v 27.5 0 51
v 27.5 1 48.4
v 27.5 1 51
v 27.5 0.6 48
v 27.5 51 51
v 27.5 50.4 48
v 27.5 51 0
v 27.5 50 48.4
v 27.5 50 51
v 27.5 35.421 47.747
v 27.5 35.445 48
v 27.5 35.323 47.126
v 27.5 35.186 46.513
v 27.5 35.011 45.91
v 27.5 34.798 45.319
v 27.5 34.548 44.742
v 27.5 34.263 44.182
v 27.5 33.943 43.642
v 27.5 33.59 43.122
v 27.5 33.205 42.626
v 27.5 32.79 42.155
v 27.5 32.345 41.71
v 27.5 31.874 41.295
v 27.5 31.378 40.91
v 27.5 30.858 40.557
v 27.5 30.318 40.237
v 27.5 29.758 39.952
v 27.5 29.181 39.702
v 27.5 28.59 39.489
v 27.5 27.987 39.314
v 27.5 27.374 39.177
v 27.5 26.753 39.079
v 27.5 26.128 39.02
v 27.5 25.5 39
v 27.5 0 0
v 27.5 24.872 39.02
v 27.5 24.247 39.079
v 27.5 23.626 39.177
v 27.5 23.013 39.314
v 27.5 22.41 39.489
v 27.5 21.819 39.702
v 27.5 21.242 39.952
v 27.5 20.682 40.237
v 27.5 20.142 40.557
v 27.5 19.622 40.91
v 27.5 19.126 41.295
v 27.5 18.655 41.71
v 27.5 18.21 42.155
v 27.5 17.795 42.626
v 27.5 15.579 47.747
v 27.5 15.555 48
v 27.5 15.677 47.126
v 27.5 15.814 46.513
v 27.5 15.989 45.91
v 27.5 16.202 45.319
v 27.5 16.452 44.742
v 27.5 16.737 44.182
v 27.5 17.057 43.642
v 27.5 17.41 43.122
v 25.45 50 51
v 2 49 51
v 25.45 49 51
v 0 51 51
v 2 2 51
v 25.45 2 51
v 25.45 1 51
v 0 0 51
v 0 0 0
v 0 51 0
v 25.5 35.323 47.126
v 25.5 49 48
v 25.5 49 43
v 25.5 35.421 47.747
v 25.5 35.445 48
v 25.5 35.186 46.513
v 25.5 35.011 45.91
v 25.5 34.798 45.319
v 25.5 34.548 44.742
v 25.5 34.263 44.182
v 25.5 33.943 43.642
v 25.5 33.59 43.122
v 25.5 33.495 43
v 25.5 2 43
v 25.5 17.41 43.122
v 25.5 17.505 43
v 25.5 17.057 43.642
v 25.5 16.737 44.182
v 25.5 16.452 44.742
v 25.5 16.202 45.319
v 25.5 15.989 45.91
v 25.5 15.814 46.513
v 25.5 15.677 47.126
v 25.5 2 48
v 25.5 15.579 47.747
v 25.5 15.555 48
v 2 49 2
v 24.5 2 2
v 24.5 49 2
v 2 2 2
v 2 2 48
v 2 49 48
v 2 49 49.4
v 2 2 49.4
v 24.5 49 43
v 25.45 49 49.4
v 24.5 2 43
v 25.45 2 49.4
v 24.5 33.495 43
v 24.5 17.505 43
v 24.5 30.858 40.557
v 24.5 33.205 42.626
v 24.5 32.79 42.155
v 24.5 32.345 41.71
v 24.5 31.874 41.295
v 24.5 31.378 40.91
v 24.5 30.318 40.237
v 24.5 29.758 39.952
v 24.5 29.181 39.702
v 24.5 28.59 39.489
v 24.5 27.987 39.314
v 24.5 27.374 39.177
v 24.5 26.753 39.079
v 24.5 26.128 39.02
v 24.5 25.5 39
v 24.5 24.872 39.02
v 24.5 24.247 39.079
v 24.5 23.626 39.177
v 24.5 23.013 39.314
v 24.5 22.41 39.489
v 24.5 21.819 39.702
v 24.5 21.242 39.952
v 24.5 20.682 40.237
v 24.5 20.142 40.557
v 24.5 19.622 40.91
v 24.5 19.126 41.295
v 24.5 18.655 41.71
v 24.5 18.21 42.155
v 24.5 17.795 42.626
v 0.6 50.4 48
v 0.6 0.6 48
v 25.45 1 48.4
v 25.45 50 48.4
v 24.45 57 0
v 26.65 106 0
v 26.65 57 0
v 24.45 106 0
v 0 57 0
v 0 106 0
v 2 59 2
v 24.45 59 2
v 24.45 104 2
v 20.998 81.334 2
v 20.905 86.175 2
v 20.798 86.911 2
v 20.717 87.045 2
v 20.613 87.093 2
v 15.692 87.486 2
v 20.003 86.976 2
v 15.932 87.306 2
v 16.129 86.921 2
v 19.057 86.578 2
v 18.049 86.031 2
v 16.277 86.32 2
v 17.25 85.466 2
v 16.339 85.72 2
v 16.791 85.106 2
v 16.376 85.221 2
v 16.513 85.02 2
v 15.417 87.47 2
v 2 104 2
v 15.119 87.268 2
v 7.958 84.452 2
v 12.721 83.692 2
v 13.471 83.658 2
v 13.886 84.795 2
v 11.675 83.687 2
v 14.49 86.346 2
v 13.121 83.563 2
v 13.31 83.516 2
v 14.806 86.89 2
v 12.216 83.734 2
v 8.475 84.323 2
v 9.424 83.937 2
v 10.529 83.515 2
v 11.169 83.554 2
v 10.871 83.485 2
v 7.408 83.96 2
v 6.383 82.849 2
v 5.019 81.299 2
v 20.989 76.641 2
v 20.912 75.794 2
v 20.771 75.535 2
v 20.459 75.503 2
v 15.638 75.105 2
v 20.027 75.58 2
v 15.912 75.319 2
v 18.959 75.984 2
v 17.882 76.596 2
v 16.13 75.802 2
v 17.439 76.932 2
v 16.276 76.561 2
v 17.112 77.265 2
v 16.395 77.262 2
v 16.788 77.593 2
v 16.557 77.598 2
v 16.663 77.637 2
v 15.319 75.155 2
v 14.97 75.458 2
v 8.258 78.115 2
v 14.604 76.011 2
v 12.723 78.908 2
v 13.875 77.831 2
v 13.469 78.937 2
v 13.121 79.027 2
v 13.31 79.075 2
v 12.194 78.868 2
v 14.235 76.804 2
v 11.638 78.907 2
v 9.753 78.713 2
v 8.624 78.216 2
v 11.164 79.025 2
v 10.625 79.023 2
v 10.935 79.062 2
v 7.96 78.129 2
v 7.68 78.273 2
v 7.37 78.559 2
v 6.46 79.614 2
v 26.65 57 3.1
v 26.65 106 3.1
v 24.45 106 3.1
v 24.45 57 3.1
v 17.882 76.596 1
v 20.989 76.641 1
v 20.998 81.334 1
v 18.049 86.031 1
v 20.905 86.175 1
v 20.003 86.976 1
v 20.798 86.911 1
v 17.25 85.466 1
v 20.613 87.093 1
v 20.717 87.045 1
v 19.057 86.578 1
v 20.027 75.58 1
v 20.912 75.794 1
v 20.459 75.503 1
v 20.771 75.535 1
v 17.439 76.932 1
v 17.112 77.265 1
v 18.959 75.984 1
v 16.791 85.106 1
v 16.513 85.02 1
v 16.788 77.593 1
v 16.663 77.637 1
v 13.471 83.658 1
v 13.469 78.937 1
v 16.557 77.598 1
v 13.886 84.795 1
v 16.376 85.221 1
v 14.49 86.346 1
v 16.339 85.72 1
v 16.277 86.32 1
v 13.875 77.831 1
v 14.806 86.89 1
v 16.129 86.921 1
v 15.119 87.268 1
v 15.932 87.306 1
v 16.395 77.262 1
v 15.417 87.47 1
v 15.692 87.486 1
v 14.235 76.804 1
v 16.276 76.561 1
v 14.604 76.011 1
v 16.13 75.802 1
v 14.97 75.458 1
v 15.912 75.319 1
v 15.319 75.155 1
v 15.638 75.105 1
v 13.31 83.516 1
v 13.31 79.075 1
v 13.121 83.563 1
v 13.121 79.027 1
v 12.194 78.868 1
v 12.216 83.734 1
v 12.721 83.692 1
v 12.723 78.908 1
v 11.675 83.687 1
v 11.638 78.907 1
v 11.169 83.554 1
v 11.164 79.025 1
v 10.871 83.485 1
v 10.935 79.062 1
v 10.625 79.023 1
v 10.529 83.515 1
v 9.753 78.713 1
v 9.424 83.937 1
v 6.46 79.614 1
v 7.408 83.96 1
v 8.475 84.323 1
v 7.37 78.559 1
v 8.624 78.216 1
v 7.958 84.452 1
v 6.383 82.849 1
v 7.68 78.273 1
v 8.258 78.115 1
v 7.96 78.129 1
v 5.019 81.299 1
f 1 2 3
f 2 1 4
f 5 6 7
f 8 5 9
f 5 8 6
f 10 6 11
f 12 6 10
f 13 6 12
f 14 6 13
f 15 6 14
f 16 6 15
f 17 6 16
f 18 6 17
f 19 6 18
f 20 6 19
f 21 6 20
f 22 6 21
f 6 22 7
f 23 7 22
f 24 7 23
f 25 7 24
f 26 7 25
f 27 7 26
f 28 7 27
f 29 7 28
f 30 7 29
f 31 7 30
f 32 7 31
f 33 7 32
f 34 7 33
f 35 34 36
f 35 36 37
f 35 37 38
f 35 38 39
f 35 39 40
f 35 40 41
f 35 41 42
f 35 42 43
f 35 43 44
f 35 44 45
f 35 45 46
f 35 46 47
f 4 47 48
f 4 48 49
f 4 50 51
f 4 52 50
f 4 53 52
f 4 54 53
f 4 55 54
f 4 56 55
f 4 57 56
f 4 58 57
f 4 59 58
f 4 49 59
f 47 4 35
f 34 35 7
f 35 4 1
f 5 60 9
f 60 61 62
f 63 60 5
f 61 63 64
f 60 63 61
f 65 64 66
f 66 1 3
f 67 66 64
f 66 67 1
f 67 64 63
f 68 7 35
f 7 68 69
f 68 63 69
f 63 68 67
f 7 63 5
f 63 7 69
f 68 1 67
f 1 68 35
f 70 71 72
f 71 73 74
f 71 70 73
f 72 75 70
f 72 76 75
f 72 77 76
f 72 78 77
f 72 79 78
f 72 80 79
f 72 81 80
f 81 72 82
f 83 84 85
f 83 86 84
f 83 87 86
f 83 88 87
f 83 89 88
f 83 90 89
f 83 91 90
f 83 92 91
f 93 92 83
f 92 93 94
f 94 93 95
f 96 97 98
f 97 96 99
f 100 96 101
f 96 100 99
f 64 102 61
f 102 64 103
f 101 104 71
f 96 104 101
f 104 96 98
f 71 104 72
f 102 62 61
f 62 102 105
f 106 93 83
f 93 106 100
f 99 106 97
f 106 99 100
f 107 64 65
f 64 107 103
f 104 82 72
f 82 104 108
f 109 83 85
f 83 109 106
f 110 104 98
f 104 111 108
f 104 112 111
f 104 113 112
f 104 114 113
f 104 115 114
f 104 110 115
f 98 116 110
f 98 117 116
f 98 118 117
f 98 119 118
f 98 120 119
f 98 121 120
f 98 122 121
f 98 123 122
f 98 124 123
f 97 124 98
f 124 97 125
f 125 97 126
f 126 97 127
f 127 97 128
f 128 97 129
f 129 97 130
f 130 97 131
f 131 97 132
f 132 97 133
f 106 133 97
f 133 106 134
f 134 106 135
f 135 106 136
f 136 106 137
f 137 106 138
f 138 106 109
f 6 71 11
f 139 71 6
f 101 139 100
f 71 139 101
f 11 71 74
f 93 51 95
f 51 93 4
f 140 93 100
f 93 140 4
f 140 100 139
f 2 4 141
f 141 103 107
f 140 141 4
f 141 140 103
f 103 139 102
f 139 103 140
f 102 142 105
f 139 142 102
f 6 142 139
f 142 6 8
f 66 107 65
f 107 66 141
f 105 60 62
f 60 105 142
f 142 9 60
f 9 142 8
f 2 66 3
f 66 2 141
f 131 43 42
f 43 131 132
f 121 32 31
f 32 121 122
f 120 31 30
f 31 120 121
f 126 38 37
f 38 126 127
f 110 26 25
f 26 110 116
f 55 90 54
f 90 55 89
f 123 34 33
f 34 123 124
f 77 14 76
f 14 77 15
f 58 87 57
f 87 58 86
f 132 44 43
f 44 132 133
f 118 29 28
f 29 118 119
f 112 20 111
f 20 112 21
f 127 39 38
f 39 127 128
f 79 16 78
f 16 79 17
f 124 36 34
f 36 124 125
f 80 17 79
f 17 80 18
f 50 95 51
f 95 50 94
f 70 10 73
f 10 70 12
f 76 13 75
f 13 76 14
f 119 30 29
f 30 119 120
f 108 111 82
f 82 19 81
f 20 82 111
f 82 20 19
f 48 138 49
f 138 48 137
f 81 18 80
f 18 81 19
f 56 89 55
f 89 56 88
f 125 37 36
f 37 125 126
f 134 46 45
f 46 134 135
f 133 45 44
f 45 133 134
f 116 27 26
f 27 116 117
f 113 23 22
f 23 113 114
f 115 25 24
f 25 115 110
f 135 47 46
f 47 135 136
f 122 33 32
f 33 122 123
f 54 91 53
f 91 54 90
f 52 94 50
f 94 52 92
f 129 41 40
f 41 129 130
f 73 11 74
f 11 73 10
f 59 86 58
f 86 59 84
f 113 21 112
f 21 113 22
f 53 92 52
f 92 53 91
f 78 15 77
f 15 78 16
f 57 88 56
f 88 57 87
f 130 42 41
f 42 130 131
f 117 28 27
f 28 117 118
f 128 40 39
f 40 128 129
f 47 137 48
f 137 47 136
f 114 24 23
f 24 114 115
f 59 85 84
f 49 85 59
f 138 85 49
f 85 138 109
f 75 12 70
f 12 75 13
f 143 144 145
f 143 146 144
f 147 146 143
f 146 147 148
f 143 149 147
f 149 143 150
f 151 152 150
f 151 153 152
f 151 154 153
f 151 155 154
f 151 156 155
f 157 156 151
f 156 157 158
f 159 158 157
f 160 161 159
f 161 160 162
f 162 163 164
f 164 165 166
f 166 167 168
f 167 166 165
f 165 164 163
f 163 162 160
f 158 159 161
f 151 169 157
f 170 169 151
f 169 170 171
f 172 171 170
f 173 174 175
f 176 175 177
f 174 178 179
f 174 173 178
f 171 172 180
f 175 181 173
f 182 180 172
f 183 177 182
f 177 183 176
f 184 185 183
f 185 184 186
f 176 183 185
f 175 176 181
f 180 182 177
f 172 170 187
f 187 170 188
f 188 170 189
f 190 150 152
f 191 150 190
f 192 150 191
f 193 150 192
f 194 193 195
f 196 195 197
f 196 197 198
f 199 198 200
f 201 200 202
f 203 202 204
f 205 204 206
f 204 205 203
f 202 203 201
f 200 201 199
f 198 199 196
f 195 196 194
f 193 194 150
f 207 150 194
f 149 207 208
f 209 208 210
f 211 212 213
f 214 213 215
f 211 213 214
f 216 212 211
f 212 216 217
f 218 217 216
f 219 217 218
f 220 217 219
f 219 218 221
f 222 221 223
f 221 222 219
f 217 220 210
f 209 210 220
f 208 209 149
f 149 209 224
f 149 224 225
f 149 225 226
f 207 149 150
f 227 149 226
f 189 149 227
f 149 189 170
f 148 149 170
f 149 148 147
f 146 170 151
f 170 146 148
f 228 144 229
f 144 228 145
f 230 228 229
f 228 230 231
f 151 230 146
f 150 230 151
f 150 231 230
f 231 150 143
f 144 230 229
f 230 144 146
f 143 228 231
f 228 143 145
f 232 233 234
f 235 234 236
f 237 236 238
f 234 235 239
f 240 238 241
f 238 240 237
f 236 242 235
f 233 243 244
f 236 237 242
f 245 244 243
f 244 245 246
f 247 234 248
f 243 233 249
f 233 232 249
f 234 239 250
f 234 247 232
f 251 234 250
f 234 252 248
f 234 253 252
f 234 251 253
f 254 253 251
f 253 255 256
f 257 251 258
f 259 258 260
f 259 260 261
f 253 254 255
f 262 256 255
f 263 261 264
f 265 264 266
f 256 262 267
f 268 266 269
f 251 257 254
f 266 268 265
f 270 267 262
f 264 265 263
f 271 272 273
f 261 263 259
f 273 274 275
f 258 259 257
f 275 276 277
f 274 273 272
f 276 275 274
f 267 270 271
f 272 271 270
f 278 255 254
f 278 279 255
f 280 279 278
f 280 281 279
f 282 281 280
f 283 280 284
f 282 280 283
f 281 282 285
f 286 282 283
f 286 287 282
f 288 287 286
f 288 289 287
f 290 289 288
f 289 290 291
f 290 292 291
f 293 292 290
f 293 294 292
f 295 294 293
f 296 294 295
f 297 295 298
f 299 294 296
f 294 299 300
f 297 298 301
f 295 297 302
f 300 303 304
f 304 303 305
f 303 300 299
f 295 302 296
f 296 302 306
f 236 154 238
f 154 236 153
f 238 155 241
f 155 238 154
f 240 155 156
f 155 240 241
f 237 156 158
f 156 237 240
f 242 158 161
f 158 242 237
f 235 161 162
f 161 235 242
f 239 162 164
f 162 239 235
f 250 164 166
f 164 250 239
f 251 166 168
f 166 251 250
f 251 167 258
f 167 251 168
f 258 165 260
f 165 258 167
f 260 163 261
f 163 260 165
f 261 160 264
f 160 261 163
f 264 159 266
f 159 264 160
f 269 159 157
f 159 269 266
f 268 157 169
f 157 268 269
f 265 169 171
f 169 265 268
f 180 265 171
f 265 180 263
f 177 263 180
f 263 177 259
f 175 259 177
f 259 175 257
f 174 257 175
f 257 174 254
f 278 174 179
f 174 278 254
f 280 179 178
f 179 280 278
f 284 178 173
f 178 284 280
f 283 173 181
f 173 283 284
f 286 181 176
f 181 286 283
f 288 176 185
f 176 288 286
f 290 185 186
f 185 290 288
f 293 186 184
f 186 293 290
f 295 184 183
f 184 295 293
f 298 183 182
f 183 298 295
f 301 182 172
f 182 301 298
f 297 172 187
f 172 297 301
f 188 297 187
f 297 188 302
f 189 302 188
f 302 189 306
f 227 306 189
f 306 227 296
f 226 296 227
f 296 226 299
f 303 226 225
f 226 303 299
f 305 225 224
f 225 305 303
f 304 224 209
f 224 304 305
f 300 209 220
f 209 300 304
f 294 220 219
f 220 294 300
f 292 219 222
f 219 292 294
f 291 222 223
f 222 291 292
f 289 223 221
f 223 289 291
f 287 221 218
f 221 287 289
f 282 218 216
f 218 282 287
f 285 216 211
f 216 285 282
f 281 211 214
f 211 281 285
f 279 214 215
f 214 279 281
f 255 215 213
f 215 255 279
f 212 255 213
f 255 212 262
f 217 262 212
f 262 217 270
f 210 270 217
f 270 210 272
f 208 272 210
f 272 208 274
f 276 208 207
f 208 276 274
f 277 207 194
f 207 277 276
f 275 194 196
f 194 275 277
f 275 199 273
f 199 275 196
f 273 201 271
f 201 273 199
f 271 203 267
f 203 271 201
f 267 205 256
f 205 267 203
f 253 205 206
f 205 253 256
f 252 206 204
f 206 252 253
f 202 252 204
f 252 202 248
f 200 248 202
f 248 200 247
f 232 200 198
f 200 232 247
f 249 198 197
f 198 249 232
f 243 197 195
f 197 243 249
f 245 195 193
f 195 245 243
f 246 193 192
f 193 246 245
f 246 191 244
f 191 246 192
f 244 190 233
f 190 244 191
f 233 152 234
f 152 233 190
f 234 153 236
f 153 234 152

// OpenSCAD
// file: carcassonne_box.scad
/**
 * @file carcassonne_box.scad
 * @author Conlan Wesson
 * Template for Carcossonne boxes.
 * @copyright Creative Commons Attribution-NonCommercial-ShareAlike 4.0
 */

mm = 1;
cm = 10*mm;

width = 47*mm;
thick = 2.5*mm;
wall = 2*mm;

/**
 * Lid for box.
 * @param count Number of cards.
 * @param columns Number of columns.
 * @param icon Path to icon DXF file.
 * @param rot Icon rotation in degrees.
 * @param mult Icon scale.
 * @param xoff X-offset of icon from center.
 * @param yoff Y-offset of icon from center.
 */
module carcassonne_lid(count, columns=1, icon=false, rot=0, mult=1, xoff=0, yoff=0, g=0){
	length = (thick * count) + ((width/2) - ((thick * count) % (width/2)));
	w = length+(1.5*wall)+.1;
	l = (width*columns)+wall;
	h = wall;
	d = 2;

	CubePoints = [
		[ 0-g, 0-g,   0 ],  //0
		[ w+g, 0-g,   0 ],  //1
		[ w+g, l+g,   0 ],  //2
		[ 0-g, l+g,   0 ],  //3
		[   d,   d, h+g ],  //4
		[   w,   d, h+g ],  //5
		[   w, l-d, h+g ],  //6
		[   d, l-d, h+g ]   //7
	];
	
	CubeFaces = [
		[0,1,2,3],  // bottom
		[4,5,1,0],  // front
		[7,6,5,4],  // top
		[5,6,2,1],  // right
		[6,7,3,2],  // back
		[7,4,0,3]   // left
	];
	
	
	difference(){
		union(){
			polyhedron( CubePoints, CubeFaces );
			translate([w-wall-.15,0,0]) cube([wall+.2,l, (1.5*wall)+.1]);
		}
		if(icon){
			translate([w/2+xoff,l/3+yoff,h-(wall/2)]){
				linear_extrude(height=(wall)+.1){
					rotate(rot) scale(mult) import(icon);
				}
			}
		}
	}
}

/**
 * Carcassonne card box.
 * @param count Number of cards.
 * @param dividers Array of divider positions.
 * @param columns Number of columns.
 */
module carcassonne_box(count, dividers=[], columns=1){
	length = (thick * count) + ((width/2) - ((thick * count) % (width/2)));
	difference(){
		union(){
			difference(){
				// Outer walls
				cube([length+(2*wall), (width*columns)+(2*wall), width+(2*wall)]);
				// Cavity
				translate([wall, wall, wall]){
					cube([length, width*columns, (width+wall)+.1]);
				}
			}
			// Dividers
			for(col = [0:columns-1]){
				for(div = dividers[col]){
					translate([(div*(width/2))+(wall/2), width*col+wall, 0]) cube([wall/2, width, width-(2*wall)]);
				}
				if(col > 0){
					translate([0, width*col+(wall/2), 0]) cube([length+(2*wall), wall/2, width-(2*wall)]);
				}
			}
		}
		union(){
			// Notch
			for(col = [0:columns-1]){
				translate([wall, wall+(width*col), wall]){
					translate([0, width/2, width])
					rotate([0, 90, 0]){
						cylinder(r=10, h=length+(2*wall), $fn=100);
					}
				}
			}
			// Track
			translate([wall/2,wall/2,width+wall/2]) carcassonne_lid(count, columns, g=0.4);
		}
	}
}
// main file
/**
 * @file abbot.scad
 * @author Conlan Wesson
 * The Abbot Carcossonne box.
 * @copyright Creative Commons Attribution-NonCommercial-ShareAlike 4.0
 */

include <carcassonne_box.scad>

count = 6;
dividers = [[1]];
columns = 1;

carcassonne_box(count, dividers, columns);
translate([0,width*columns+10,0]) carcassonne_lid(count, columns, icon="abbot.dxf", rot=90, mult=0.5, xoff=10, yoff=1);
